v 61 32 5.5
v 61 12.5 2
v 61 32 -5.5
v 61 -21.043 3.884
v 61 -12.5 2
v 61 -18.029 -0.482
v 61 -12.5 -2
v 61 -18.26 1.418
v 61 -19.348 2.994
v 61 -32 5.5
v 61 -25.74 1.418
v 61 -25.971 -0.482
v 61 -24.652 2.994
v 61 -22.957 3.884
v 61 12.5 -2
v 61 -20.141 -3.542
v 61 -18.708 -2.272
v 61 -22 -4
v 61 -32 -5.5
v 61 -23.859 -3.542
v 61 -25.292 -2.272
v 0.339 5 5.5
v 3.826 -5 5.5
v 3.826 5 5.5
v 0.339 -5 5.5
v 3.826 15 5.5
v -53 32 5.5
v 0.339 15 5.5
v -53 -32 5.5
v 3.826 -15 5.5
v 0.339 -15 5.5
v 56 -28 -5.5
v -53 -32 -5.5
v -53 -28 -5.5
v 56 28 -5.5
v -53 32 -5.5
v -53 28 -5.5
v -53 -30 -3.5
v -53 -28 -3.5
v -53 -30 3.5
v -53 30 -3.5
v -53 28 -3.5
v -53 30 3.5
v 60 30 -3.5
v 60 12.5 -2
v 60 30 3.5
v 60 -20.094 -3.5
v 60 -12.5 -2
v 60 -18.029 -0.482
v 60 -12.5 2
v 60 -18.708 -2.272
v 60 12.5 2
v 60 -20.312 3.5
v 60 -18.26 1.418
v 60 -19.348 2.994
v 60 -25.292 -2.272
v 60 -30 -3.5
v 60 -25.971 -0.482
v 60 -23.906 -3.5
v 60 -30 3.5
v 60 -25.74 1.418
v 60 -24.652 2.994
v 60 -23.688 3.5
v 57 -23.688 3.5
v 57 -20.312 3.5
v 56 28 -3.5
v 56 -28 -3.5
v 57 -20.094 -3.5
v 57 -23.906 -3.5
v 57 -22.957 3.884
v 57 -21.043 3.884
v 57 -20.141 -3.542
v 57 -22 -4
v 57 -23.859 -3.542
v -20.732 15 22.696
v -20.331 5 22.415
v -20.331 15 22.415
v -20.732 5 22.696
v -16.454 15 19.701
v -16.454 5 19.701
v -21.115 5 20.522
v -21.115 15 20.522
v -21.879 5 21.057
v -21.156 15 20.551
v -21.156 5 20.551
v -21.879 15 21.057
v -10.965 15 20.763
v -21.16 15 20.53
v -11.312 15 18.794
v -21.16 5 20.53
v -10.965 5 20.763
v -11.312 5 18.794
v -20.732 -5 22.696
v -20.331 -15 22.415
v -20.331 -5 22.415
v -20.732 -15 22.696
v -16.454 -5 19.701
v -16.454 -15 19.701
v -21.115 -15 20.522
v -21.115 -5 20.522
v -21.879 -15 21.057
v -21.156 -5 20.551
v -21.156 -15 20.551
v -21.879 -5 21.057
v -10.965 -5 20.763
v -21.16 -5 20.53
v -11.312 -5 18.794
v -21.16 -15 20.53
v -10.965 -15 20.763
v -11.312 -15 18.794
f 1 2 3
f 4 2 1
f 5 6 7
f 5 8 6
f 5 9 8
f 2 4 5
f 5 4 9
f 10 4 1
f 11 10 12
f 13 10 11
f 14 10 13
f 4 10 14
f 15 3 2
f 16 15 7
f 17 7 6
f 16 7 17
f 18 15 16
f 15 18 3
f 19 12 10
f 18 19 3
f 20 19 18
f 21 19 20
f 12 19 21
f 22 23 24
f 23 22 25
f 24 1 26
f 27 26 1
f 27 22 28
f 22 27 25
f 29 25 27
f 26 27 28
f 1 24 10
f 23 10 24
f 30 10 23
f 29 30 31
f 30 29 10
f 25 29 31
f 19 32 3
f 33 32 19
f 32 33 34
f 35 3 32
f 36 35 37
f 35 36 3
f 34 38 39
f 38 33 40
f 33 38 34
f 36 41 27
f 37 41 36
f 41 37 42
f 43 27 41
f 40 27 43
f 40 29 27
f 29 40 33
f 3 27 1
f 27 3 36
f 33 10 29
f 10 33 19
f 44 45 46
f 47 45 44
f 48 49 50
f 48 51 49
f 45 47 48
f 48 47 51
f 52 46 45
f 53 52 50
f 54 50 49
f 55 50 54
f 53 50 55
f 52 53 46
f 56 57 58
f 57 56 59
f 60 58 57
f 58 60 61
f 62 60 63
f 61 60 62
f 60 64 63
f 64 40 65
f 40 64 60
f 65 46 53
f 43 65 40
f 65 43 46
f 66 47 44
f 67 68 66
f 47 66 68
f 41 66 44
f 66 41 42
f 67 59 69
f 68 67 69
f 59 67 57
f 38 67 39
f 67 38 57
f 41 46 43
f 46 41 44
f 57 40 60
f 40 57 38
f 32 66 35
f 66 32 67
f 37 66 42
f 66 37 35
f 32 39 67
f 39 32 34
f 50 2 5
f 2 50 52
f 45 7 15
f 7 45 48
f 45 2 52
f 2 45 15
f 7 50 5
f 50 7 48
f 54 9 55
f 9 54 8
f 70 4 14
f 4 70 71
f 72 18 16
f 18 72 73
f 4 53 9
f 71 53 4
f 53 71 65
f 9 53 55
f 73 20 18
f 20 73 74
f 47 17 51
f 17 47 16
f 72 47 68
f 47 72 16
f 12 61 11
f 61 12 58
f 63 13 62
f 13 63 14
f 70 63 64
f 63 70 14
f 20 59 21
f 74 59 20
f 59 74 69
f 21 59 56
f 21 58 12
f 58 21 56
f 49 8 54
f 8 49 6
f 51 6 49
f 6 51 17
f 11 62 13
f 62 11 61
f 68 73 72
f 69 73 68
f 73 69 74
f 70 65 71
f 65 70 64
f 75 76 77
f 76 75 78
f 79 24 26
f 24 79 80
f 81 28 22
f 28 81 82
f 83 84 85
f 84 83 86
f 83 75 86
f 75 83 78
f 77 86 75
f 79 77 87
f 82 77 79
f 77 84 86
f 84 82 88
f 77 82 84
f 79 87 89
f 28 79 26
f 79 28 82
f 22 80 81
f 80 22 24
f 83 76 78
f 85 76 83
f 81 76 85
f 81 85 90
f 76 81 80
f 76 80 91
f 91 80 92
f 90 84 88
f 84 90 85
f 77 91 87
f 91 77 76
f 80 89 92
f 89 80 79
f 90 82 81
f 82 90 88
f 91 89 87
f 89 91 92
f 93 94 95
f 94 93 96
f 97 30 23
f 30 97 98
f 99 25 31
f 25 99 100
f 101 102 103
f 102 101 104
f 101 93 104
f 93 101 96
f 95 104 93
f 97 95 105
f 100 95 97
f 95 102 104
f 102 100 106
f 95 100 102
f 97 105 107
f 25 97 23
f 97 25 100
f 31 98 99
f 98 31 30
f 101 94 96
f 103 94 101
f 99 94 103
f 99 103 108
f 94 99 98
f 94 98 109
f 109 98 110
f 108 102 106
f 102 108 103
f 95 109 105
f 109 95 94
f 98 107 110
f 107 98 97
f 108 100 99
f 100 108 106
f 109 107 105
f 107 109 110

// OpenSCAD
// variable description
thickness = 7; //[6:12]
height = 114; //[110:150]
angle = 35; //[20:60]


module case(){
	difference(){
		difference(){
			difference(){
				difference(){
					translate([4,0,0])cube([height,64,thickness+4],center=true);
					cube([height+6,60,thickness],center=true);
				}
				translate([-4,0,-5])cube([height+6,56,thickness+2],center=true);
			}	
			translate([height/2,0,0])cube([10,25,4],center=true);
		}
		translate([height/2,-22,0])rotate(a=[0,90,0])cylinder(h=8,r=4);
	}
}

module anchor(){
	union(){
		translate([-15,0,(thickness/2)+2.2])cube([30,10,2],center=true);
		translate([-25,0,(thickness/2)+4.2])rotate(a=[0,-25,0])cube([10,10,2],center=true);
	}
}

union(){
	case();
	translate([0,10,0])rotate([0,angle,0])anchor();
	translate([0,-10,0])rotate([0,angle,0])anchor();
}
